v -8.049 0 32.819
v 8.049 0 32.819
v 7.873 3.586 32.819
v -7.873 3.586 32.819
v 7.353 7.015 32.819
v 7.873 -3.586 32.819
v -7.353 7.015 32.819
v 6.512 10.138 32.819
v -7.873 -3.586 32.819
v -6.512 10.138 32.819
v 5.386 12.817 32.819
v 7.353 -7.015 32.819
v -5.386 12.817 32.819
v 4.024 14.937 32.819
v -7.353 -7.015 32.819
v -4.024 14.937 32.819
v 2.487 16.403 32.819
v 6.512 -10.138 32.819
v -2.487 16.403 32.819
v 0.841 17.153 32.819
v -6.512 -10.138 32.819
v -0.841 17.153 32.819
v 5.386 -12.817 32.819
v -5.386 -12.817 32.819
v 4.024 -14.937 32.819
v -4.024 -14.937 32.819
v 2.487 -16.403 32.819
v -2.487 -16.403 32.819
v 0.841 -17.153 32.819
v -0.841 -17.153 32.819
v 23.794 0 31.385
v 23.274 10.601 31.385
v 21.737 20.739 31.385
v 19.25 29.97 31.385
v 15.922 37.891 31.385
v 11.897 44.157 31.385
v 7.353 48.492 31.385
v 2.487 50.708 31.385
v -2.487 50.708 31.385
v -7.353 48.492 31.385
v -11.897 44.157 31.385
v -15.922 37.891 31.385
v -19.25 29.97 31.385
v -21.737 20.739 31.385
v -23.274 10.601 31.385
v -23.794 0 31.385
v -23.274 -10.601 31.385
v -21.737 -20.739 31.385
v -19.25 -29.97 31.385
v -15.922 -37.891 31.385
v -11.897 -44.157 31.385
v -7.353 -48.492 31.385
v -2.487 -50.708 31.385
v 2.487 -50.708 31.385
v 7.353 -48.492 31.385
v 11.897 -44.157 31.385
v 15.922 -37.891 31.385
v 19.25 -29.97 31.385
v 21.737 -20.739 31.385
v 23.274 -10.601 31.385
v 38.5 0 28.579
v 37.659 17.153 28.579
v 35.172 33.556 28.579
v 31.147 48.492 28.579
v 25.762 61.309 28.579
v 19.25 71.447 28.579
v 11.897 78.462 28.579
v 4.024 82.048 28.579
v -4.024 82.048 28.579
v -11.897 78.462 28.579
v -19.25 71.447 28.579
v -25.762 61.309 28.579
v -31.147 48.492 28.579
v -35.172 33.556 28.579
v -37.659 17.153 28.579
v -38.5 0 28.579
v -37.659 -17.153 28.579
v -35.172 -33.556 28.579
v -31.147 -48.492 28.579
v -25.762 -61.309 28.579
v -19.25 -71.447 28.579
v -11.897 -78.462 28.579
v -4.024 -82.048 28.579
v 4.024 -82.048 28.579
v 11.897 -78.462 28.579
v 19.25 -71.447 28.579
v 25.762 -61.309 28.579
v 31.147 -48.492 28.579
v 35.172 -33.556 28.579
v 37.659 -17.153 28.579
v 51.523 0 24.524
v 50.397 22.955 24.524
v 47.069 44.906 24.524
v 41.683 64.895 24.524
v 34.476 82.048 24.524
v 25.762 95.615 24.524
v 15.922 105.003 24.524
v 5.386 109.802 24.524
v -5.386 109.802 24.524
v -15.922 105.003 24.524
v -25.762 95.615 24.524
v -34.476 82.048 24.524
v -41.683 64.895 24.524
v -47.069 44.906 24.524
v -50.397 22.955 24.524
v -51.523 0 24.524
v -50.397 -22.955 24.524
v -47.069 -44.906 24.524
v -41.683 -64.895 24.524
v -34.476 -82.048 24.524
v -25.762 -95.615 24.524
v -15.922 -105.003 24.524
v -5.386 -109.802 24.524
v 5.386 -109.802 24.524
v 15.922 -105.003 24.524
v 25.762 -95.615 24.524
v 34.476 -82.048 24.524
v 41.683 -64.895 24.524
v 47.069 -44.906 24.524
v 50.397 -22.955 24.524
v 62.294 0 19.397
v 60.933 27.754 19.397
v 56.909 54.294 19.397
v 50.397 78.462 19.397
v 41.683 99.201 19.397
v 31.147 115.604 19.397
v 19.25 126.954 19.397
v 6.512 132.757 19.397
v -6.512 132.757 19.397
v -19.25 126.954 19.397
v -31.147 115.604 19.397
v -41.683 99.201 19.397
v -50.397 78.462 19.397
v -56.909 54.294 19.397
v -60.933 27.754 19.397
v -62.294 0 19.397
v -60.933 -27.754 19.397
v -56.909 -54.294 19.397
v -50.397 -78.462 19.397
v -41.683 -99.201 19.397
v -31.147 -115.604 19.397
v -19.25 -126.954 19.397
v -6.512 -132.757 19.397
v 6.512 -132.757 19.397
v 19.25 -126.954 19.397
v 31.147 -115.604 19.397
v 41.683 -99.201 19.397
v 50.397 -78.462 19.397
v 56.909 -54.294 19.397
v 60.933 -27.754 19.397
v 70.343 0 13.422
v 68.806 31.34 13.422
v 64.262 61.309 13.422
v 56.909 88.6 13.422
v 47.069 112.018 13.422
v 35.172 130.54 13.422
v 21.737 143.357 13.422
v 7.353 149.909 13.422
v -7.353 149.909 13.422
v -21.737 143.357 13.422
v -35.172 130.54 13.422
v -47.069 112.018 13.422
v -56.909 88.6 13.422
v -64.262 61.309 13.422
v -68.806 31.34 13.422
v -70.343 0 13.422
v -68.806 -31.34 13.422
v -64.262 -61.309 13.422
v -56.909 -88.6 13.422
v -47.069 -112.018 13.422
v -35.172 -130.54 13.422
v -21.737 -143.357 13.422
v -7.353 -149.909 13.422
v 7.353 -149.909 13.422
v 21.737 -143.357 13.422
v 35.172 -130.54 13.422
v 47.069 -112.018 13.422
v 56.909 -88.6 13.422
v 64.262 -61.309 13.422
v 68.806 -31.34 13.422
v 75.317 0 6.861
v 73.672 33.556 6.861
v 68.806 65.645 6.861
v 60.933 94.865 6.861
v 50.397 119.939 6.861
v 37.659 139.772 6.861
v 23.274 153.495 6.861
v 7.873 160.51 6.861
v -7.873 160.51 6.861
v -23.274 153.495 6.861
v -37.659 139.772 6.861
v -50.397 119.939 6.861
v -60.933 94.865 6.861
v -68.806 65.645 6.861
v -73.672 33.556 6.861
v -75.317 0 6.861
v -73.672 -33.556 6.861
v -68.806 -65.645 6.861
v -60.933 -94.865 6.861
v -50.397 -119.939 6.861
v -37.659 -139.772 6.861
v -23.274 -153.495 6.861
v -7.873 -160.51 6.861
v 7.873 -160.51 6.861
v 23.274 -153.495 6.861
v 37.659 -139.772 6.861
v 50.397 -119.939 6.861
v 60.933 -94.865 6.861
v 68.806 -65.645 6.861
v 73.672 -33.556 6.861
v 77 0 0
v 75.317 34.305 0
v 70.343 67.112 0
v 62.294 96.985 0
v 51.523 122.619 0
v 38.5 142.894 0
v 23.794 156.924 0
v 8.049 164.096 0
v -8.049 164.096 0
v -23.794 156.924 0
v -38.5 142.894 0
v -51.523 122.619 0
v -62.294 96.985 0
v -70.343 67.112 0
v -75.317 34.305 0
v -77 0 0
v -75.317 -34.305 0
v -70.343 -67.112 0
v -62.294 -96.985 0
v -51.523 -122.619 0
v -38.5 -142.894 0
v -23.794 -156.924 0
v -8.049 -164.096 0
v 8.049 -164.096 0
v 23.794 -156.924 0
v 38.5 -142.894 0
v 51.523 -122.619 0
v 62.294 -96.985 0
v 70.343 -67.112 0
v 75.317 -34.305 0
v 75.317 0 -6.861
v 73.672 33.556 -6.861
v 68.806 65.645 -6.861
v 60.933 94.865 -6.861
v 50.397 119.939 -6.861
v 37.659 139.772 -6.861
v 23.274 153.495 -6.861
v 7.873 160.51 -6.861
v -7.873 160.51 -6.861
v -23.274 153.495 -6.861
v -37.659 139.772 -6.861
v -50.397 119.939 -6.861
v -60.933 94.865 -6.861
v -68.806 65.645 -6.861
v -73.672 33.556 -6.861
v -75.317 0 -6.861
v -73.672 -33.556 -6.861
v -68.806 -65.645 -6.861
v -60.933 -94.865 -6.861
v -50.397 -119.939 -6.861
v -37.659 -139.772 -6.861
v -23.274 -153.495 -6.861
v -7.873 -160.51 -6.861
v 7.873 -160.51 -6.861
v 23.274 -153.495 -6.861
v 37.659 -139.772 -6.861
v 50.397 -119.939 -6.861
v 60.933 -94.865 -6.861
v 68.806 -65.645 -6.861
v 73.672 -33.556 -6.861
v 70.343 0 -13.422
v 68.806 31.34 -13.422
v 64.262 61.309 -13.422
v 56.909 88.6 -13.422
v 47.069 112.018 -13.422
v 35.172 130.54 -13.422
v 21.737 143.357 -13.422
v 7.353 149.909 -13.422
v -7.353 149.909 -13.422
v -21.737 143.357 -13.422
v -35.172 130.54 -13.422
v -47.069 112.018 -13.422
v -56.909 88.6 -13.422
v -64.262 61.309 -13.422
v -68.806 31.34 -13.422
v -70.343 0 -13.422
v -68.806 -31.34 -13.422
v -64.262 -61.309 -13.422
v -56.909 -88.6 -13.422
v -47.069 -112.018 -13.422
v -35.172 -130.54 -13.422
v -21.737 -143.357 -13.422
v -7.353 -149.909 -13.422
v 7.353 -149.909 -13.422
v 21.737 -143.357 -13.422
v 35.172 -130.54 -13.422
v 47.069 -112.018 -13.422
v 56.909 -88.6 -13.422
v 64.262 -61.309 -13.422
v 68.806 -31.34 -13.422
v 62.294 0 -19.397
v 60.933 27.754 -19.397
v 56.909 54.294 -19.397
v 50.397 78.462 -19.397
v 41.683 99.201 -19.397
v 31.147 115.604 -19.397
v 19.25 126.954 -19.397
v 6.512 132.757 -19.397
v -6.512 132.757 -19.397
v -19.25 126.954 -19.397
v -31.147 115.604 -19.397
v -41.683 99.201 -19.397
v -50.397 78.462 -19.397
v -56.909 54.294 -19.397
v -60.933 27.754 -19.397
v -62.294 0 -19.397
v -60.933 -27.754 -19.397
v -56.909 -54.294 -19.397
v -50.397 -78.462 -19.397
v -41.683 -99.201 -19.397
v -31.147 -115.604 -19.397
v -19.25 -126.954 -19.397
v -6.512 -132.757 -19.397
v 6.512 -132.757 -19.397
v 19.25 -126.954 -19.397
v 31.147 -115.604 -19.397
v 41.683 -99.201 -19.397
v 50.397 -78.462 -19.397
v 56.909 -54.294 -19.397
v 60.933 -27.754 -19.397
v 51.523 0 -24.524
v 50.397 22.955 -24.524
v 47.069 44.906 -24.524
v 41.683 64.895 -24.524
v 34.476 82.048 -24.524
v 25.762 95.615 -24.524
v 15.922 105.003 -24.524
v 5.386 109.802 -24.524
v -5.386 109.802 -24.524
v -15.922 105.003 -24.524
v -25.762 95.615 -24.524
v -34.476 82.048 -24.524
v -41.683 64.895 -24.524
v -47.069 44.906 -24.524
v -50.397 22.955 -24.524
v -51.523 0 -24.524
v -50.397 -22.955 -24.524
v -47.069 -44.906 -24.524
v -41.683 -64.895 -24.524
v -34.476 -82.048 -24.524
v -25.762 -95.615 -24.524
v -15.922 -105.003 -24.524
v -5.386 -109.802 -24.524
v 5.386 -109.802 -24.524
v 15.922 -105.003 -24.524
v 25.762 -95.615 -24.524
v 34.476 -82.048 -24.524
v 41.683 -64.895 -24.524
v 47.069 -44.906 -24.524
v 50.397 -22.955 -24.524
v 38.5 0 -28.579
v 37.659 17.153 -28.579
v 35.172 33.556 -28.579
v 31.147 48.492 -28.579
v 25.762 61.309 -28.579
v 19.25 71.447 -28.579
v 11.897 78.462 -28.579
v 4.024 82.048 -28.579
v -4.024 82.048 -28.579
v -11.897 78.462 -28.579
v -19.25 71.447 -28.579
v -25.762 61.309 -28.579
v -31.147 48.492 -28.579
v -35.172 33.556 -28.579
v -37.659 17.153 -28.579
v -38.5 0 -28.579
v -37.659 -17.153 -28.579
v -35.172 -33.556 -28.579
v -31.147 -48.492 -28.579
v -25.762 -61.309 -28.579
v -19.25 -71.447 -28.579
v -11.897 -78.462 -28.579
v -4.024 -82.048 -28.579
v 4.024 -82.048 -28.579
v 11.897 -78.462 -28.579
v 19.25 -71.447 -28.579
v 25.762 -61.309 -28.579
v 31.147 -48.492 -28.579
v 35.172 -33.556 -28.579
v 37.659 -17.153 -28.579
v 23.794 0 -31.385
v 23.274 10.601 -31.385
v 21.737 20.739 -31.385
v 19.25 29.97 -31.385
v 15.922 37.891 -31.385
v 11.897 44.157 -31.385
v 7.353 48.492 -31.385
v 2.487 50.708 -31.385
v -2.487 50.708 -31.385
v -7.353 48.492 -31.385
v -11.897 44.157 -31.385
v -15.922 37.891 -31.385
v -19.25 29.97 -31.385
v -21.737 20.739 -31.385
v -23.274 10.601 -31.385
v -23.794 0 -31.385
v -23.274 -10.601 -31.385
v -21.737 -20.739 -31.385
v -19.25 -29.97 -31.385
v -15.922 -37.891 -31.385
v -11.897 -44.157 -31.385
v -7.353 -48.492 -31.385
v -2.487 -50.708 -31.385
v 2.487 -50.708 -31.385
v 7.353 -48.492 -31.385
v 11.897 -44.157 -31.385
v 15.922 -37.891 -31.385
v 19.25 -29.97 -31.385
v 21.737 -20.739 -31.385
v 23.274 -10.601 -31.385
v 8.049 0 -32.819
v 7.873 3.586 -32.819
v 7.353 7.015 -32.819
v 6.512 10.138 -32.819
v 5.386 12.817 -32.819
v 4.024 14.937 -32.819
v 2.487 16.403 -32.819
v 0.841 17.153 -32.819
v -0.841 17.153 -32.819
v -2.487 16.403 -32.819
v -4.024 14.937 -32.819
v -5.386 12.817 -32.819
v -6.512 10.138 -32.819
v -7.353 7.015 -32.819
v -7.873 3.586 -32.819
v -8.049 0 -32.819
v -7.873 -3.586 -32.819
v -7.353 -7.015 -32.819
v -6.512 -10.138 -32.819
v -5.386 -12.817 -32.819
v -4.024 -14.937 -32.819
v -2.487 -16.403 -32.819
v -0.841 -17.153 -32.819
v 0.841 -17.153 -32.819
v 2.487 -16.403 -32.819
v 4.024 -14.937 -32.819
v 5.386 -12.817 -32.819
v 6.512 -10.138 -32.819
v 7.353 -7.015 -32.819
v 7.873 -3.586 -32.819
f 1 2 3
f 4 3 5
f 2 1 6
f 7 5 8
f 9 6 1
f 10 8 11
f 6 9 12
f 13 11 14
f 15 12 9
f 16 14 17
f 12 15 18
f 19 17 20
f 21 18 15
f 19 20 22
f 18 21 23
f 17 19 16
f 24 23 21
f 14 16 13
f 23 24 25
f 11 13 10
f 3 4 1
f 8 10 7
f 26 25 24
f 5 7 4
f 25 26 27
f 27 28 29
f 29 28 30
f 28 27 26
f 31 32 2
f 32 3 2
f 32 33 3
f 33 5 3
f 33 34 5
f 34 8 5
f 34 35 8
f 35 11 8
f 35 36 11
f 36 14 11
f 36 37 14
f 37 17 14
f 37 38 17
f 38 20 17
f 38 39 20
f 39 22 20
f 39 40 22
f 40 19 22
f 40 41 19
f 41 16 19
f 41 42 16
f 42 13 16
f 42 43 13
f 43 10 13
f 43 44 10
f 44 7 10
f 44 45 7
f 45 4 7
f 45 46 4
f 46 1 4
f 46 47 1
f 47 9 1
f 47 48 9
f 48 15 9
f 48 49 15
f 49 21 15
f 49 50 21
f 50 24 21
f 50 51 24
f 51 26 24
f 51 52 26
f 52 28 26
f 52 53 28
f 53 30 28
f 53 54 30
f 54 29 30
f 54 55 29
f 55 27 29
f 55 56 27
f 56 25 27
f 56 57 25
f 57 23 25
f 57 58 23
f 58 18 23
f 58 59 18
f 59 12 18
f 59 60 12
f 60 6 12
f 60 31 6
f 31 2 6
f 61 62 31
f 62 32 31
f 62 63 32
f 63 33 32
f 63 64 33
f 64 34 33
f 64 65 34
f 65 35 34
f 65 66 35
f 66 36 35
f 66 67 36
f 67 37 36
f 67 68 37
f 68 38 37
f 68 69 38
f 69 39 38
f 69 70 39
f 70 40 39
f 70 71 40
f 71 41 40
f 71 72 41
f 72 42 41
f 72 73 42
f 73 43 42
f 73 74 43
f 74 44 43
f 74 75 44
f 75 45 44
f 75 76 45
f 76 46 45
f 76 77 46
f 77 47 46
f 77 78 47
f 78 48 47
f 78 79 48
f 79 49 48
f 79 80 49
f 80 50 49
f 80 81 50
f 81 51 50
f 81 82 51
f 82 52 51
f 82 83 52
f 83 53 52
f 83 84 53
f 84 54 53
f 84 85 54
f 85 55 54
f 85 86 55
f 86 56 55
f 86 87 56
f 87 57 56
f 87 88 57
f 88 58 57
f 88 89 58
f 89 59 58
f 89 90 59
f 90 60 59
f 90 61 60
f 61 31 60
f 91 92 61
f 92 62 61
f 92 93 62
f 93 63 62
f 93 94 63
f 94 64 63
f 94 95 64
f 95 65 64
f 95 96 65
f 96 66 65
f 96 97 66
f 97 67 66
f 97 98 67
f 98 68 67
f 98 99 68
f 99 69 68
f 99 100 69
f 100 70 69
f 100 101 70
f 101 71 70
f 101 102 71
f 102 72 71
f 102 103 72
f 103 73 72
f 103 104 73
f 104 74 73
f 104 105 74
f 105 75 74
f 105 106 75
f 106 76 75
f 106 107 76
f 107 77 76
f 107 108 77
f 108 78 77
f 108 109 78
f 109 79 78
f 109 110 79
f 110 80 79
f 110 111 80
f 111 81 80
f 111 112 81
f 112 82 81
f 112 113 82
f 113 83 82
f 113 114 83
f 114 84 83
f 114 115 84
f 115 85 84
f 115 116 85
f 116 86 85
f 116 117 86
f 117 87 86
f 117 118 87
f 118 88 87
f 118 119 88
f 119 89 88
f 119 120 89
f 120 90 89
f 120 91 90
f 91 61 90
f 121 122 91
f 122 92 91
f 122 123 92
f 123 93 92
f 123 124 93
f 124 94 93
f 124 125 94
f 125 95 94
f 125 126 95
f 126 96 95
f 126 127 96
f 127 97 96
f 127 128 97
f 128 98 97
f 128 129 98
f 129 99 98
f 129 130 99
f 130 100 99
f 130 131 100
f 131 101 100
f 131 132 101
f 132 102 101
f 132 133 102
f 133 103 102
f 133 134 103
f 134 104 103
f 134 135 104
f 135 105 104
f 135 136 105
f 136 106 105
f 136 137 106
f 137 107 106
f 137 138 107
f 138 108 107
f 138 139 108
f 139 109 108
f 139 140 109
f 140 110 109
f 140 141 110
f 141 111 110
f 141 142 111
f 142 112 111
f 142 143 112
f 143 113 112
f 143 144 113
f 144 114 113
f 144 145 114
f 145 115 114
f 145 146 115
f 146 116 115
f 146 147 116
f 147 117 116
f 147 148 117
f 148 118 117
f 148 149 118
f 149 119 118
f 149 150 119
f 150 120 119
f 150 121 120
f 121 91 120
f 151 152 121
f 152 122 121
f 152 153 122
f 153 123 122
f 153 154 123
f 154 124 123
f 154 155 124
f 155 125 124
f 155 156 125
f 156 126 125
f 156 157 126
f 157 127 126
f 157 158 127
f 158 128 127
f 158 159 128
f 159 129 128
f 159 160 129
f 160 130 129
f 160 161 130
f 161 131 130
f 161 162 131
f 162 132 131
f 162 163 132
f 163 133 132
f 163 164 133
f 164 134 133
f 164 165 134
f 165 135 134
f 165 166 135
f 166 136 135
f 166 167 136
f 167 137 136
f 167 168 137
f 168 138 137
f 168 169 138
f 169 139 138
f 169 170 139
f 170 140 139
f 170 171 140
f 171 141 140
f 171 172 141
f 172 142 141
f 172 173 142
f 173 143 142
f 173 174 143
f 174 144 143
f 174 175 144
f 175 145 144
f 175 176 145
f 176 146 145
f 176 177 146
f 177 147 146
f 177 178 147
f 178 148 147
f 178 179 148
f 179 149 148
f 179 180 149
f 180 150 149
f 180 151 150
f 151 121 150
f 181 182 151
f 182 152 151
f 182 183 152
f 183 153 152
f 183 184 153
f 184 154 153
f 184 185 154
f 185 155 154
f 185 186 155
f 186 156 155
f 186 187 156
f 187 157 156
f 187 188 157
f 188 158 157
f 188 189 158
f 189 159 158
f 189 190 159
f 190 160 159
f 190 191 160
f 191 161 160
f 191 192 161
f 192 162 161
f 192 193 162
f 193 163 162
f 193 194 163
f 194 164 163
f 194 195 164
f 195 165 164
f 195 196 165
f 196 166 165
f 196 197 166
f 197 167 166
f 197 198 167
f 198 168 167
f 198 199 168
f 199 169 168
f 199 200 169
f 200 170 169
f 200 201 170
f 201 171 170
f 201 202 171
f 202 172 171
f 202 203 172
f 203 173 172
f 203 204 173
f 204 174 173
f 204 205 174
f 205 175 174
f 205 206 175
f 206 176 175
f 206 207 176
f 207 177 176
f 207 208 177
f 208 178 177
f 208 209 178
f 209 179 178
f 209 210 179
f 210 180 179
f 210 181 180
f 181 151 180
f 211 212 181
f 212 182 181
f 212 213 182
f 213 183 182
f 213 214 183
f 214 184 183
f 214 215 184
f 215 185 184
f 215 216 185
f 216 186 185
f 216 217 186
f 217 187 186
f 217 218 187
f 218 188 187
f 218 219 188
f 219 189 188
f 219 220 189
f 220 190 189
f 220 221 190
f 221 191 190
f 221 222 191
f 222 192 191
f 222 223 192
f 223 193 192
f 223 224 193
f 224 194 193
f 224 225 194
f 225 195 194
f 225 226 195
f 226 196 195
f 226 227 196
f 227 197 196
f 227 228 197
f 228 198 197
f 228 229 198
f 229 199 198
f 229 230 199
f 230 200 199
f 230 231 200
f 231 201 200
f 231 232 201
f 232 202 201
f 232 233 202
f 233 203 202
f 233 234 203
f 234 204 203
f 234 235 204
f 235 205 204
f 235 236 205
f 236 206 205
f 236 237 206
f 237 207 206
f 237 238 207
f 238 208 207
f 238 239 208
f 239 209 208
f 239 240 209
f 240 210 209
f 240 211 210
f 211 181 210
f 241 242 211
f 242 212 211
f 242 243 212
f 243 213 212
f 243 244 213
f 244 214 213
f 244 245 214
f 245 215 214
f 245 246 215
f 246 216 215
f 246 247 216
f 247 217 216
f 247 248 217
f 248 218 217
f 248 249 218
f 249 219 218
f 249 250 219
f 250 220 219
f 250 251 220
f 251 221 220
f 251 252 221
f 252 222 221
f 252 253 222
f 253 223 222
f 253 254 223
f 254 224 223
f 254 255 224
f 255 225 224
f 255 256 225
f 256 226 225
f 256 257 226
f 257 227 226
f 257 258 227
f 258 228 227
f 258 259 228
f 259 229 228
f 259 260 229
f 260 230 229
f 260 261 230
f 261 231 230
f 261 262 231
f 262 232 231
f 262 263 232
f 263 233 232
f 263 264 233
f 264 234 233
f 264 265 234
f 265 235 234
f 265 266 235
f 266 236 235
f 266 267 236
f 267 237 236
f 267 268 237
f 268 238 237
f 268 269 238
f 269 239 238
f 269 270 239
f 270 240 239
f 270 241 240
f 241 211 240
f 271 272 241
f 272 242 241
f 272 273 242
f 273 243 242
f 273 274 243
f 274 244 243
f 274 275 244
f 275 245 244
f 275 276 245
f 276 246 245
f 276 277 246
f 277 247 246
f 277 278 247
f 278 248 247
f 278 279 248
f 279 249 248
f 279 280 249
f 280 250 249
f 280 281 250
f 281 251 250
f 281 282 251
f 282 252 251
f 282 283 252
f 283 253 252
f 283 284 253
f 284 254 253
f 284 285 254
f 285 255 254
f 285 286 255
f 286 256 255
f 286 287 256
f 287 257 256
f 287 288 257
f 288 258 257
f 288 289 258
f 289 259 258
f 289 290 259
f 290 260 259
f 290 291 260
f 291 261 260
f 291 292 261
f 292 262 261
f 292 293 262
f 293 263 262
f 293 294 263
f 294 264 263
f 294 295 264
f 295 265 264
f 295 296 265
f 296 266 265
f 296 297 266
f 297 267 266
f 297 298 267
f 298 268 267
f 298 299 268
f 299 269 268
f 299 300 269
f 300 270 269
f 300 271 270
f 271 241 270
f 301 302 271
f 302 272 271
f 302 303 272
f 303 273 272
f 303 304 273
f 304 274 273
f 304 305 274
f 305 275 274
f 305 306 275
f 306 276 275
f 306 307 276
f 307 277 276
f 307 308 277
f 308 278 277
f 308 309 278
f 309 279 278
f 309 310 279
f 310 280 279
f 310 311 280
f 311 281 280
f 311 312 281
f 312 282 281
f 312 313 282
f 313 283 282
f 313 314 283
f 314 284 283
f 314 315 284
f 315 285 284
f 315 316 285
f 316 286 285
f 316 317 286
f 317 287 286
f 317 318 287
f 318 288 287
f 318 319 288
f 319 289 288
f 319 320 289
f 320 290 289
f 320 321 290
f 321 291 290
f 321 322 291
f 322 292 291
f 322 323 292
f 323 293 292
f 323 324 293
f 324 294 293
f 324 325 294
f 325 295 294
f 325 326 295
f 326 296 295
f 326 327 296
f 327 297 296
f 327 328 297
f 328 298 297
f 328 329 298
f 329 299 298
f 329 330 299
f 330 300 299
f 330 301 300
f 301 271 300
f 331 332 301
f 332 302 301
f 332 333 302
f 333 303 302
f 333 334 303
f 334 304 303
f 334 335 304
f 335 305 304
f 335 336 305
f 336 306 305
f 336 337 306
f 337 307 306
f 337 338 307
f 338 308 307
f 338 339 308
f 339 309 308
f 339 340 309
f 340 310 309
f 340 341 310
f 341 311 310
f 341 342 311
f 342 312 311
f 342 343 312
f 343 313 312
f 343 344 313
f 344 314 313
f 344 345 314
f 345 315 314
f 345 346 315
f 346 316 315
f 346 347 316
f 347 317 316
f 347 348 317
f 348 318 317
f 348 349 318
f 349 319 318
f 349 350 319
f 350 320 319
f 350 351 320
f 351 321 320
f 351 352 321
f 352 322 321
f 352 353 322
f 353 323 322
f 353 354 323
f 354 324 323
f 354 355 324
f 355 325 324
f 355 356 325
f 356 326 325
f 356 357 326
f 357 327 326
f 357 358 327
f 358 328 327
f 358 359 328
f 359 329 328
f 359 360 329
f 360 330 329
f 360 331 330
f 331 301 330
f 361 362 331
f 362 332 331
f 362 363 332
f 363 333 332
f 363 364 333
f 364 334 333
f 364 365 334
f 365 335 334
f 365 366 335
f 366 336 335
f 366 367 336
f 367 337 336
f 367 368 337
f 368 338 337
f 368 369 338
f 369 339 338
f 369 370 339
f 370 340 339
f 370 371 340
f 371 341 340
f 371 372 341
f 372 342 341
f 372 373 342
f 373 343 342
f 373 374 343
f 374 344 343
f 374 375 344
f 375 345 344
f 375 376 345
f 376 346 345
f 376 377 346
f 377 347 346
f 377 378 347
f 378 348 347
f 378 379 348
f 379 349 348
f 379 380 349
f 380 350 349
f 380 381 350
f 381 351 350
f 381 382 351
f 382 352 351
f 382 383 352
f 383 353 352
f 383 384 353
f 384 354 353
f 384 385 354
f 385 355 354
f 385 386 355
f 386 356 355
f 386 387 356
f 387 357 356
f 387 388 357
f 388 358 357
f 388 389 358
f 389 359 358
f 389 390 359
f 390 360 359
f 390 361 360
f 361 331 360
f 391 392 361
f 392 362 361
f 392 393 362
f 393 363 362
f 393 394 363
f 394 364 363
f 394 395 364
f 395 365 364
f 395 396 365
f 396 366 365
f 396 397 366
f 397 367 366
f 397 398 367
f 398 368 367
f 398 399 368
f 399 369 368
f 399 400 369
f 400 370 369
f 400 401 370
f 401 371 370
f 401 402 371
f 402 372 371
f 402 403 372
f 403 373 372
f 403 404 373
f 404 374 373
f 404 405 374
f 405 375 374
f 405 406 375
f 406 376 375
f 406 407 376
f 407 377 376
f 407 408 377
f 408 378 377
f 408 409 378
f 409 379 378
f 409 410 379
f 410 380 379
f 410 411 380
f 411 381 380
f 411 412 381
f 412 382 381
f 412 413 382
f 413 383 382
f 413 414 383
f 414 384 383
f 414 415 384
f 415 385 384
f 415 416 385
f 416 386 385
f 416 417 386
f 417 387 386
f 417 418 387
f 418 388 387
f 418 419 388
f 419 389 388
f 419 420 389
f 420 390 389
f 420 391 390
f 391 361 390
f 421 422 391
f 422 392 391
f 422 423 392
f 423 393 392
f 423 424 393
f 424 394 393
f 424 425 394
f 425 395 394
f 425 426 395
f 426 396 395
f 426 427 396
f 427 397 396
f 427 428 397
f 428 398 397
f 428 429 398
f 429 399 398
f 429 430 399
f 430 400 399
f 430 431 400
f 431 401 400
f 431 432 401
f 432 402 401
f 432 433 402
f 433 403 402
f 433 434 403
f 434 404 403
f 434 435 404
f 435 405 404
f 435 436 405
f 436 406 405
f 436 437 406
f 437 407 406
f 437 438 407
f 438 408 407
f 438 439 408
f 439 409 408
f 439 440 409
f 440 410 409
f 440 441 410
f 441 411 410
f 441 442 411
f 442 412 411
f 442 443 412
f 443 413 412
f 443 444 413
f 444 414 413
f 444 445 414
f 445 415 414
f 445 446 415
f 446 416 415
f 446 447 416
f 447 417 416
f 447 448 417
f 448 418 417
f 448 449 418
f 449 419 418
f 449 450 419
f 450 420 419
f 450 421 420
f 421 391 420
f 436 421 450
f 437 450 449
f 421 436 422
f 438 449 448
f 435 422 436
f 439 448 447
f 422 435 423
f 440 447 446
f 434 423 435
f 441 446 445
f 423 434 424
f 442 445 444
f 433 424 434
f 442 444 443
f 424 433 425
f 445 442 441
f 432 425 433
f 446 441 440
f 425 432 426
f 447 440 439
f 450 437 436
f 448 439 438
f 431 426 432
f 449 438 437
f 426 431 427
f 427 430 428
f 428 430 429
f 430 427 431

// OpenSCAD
// Generated by SolidPython 1.0.1 on 2020-07-29 00:46:48


scale(v = [7, 15, 3]) {
	sphere(r = 11);
}
/***********************************************
*********      SolidPython code:      **********
************************************************
 
# import packages: SolidPython
from solid import *
from solid.utils import *
from itertools import chain, combinations, permutations


class Resize:

    def __init__(self, scad_file):
        self.scad_file = scad_file
        #self.scad_file = import_scad(scad_file)
        # cone/cylinder param:
        self.r1 = 0
        self.r2 = 0
        self.h = 0
        # rectangular prism param:
        self.w = 0
        self.l = 0
        # ellipse param:
        self.r = 0

    # import OpenScad code (file name corresponds to shape)


    # classify shape + parameters
    def assign(self, param1, param2, param3):
        if self.scad_file == 'cone.scad':
            self.r1 = param1
            self.r2 = param2
            self.h = param3
        elif self.scad_file == 'cylinder.scad':
            self.r1 = param1
            self.r2 = param2
            self.h = param3
        elif self.scad_file == 'rectangularPrism.scad':
            self.h = param1
            self.l = param2
            self.w = param3
        else:
            self.r = param1
            self.h = param2

    # resize parameters
    def iterate(self):
        x = range(3, 20, 2)
        i = 1
        if self.scad_file == 'cone.scad':
            tempList = list(permutations(x, 2))
            for temp in tempList:
                param1 = temp[0]
                param2 = temp[1]
                filepath = 'produced_scad_files/' + 'cone' + str(param1) + '_' + str(param2) + '_' + '.scad'
                scad_render_to_file(cylinder(h=param1, r1=param2, r2=0), filepath)

        elif self.scad_file == 'cylinder.scad':
            tempList = list(permutations(x, 3))
            for temp in tempList:
                param1 = temp[0]
                param2 = temp[1]
                filepath = 'produced_scad_files/' + 'cylinder' + str(param1) + '_' + str(param2) + '_' + '.scad'
                scad_render_to_file(cylinder(h=param1, r1=param2, r2=param2), filepath)

        elif self.scad_file == 'rectangularPrism.scad':
            tempList = list(permutations(x, 3))
            for temp in tempList:
                param1 = temp[0]
                param2 = temp[1]
                param3 = temp[2]
                filepath = 'produced_scad_files/' + 'rectangularPrism' + str(param1) + '_' + str(param2) + '_' + str(
                    param3) + '.scad'
                scad_render_to_file(cube(size=(param1, param2, param3)), filepath)

        elif self.scad_file == 'ellipse.scad':
            tempList = list(permutations(x, 4))
            for temp in tempList:
                param1 = temp[0]
                param2 = temp[1]
                param3 = temp[2]
                param4 = temp[3]
                filepath = 'produced_scad_files/' + 'ellipse' + str(param1) + '_' + str(param2) + '_' + str(param3) + '_' + str(param4) + '.scad'
                scad_render_to_file(scale([param1, param2, param3])(sphere(r=param4)), filepath)

    def render_to_scadfile(self):
        scad_render_to_file(scad, 'example.scad') 
 
************************************************/
